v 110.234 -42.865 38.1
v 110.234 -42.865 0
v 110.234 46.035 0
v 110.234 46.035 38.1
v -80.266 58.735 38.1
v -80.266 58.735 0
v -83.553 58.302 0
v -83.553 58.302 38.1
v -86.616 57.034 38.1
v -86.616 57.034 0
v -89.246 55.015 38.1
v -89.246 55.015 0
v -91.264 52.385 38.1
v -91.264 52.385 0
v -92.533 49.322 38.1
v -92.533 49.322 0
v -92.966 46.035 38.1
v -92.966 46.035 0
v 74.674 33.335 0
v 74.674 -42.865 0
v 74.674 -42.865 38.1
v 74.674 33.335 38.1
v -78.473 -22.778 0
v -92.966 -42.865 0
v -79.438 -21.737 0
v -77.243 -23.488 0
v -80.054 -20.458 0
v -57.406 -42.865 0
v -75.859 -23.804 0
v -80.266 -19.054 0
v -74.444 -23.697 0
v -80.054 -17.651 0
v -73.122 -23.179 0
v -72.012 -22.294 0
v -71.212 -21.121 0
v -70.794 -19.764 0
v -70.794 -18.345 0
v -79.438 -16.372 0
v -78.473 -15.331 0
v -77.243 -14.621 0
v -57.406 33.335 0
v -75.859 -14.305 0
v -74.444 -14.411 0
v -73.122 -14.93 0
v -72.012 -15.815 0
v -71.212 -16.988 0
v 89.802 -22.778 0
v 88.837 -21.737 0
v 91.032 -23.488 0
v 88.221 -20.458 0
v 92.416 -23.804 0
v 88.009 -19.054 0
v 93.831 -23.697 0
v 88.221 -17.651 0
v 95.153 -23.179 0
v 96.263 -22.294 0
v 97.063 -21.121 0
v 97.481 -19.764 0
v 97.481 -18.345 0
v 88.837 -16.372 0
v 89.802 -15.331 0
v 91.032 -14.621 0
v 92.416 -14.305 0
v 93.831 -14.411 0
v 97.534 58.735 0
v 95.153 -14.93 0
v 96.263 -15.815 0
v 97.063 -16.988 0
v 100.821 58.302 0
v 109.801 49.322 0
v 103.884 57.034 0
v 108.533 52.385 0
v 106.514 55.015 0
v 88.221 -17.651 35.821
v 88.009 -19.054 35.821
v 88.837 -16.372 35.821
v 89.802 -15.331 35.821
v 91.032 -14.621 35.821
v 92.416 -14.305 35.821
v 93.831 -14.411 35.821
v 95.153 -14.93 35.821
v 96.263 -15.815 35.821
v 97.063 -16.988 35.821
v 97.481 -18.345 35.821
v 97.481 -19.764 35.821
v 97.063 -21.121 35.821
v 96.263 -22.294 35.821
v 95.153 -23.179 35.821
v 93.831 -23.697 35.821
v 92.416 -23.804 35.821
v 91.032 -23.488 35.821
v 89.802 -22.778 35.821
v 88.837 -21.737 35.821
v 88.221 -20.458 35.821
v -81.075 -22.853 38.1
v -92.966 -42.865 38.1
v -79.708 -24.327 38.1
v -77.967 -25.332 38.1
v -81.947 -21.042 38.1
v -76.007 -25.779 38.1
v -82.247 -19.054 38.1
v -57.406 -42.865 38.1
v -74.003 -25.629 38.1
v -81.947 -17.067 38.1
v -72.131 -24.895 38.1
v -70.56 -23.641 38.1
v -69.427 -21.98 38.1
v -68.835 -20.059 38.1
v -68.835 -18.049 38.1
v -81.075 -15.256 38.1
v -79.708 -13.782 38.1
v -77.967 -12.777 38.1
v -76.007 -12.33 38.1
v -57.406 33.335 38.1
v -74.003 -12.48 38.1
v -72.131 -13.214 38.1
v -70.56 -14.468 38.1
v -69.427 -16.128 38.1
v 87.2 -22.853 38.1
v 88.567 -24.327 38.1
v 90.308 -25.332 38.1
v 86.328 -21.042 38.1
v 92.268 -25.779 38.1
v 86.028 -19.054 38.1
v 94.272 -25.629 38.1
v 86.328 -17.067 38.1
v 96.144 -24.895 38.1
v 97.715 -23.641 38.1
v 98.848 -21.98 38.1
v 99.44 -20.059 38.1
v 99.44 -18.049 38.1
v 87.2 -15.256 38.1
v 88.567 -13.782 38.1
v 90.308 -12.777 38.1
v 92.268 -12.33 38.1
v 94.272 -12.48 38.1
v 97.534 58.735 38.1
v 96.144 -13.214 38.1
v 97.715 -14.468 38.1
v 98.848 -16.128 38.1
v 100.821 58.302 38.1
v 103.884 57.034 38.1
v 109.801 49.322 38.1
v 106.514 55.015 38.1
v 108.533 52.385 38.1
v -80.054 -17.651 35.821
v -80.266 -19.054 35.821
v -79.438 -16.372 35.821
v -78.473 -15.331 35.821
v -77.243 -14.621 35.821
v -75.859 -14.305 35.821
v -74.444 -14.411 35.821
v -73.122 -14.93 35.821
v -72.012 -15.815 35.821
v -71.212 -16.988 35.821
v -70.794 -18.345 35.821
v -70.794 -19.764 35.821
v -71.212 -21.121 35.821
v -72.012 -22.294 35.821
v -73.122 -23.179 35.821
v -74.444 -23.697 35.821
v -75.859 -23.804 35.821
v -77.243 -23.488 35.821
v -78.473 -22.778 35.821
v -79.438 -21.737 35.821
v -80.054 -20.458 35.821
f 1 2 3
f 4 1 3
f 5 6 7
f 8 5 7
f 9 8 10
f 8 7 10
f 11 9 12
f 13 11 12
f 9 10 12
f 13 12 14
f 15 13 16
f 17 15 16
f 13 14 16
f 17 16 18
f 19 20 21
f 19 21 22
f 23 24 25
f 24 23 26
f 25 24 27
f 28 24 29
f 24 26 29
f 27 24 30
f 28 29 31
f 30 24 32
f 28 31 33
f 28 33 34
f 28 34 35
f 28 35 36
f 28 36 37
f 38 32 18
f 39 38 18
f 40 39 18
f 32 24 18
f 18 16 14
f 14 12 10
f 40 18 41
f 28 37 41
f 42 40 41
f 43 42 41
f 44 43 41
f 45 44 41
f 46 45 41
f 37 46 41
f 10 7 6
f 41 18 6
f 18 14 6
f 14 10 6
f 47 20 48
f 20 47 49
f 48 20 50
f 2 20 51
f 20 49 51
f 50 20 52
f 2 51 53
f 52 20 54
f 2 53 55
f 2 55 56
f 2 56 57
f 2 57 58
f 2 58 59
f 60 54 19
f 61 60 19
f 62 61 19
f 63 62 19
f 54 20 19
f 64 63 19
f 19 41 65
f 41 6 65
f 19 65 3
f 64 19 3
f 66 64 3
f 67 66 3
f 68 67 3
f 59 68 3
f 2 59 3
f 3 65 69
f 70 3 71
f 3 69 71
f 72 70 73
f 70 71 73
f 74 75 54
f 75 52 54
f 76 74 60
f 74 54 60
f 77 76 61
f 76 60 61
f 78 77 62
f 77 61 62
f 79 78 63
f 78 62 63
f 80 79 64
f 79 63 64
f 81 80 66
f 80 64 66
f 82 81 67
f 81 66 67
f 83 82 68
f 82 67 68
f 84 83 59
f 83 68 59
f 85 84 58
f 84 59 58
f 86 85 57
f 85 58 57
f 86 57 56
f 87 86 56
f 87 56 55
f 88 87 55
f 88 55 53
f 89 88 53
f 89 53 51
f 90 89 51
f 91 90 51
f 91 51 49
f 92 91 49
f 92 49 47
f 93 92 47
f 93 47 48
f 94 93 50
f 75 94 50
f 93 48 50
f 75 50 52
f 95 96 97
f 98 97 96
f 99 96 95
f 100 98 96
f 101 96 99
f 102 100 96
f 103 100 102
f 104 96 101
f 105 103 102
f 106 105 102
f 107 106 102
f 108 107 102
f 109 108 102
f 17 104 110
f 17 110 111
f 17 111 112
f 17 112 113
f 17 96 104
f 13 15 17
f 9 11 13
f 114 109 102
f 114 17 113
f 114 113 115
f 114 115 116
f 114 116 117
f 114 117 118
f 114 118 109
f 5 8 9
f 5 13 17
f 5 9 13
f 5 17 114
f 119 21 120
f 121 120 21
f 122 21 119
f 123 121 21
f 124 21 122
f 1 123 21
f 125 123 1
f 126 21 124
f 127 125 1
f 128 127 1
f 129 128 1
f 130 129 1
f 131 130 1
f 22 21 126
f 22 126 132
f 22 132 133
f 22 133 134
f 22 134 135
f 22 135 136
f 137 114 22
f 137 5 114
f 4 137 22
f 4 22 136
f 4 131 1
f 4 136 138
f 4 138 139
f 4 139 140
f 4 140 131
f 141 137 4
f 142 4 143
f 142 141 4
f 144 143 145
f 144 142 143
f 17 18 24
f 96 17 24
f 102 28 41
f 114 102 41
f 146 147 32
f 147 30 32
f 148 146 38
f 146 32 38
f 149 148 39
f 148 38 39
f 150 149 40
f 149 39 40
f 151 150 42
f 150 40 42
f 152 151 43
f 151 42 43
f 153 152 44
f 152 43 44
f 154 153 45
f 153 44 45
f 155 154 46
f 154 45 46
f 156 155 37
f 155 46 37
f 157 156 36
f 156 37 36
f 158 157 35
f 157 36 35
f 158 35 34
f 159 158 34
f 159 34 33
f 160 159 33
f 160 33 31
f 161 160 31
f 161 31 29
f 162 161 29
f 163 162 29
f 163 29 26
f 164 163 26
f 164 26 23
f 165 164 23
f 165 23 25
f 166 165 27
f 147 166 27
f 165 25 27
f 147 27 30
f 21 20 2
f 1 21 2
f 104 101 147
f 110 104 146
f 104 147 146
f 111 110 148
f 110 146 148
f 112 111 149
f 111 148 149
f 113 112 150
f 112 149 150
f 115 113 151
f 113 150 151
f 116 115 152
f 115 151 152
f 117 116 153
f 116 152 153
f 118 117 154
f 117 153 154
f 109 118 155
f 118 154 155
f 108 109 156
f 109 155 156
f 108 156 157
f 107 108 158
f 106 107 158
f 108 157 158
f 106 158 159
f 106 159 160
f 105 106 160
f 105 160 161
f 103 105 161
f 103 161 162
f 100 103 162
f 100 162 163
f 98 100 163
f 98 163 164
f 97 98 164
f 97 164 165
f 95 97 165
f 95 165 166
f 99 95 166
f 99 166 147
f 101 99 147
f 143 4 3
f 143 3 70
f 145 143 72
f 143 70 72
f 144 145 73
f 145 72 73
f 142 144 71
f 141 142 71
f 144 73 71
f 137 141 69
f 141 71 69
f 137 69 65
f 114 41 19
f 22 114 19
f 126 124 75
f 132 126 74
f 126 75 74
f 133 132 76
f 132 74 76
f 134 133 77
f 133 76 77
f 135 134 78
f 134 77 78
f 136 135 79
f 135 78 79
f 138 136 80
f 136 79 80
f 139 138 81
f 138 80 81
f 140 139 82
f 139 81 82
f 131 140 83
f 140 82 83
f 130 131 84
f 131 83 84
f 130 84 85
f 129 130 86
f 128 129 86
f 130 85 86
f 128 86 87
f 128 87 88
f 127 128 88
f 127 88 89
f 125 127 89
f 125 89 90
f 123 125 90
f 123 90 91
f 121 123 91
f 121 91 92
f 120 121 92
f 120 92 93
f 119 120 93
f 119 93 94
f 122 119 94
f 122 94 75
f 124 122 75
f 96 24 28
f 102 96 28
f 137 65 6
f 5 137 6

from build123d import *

# Parameters (mm, degrees)
F0_W           = 35.56
F0_H           = 76.2
F1_DEPTH       = 38.1
F3_D           = 9.525
F3_CSINK_D     = 13.4874
F3_CSINK_ANGLE = 82


# Not quite as in the source:
# - a length typed as a fraction of an inch, garbled in the dataset ("3 / 203.2 mm" for 3/8 in), is restored


with BuildPart() as f1:
    # F0 (on Top) → F1 (new body)
    with BuildSketch(Plane.XY):
        with BuildLine():
            Line((97.53417238, 58.7352159441), (-80.26582762, 58.7352159441))
            ThreePointArc((-80.26582762, 58.7352159441), (-89.2460837411, 55.0154720651), (-92.96582762, 46.0352159441))
            Line((-92.96582762, 46.0352159441), (-92.96582762, 33.3352159441))
            Line((-92.96582762, 33.3352159441), (-57.40582762, 33.3352159441))
            Line((-57.40582762, 33.3352159441), (74.67417238, 33.3352159441))
            Line((74.67417238, 33.3352159441), (110.23417238, 33.3352159441))
            Line((110.23417238, 33.3352159441), (110.23417238, 46.0352159441))
            ThreePointArc((110.23417238, 46.0352159441), (106.514428501, 55.0154720651), (97.53417238, 58.7352159441))
        make_face()
        with Locations((-75.18582762, -4.7647840559)):
            Rectangle(F0_W, F0_H)
        with Locations((92.45417238, -4.7647840559)):
            Rectangle(F0_W, F0_H)
    extrude(amount=F1_DEPTH)

    # F3 (through all)
    with Locations(Plane.XY.offset(38.1)):
        with Locations((-75.50332762, -19.0544008167), (92.77167238, -19.0544008167)):
            CounterSinkHole(F3_D / 2, F3_CSINK_D / 2, counter_sink_angle=F3_CSINK_ANGLE)


solid = f1.part
